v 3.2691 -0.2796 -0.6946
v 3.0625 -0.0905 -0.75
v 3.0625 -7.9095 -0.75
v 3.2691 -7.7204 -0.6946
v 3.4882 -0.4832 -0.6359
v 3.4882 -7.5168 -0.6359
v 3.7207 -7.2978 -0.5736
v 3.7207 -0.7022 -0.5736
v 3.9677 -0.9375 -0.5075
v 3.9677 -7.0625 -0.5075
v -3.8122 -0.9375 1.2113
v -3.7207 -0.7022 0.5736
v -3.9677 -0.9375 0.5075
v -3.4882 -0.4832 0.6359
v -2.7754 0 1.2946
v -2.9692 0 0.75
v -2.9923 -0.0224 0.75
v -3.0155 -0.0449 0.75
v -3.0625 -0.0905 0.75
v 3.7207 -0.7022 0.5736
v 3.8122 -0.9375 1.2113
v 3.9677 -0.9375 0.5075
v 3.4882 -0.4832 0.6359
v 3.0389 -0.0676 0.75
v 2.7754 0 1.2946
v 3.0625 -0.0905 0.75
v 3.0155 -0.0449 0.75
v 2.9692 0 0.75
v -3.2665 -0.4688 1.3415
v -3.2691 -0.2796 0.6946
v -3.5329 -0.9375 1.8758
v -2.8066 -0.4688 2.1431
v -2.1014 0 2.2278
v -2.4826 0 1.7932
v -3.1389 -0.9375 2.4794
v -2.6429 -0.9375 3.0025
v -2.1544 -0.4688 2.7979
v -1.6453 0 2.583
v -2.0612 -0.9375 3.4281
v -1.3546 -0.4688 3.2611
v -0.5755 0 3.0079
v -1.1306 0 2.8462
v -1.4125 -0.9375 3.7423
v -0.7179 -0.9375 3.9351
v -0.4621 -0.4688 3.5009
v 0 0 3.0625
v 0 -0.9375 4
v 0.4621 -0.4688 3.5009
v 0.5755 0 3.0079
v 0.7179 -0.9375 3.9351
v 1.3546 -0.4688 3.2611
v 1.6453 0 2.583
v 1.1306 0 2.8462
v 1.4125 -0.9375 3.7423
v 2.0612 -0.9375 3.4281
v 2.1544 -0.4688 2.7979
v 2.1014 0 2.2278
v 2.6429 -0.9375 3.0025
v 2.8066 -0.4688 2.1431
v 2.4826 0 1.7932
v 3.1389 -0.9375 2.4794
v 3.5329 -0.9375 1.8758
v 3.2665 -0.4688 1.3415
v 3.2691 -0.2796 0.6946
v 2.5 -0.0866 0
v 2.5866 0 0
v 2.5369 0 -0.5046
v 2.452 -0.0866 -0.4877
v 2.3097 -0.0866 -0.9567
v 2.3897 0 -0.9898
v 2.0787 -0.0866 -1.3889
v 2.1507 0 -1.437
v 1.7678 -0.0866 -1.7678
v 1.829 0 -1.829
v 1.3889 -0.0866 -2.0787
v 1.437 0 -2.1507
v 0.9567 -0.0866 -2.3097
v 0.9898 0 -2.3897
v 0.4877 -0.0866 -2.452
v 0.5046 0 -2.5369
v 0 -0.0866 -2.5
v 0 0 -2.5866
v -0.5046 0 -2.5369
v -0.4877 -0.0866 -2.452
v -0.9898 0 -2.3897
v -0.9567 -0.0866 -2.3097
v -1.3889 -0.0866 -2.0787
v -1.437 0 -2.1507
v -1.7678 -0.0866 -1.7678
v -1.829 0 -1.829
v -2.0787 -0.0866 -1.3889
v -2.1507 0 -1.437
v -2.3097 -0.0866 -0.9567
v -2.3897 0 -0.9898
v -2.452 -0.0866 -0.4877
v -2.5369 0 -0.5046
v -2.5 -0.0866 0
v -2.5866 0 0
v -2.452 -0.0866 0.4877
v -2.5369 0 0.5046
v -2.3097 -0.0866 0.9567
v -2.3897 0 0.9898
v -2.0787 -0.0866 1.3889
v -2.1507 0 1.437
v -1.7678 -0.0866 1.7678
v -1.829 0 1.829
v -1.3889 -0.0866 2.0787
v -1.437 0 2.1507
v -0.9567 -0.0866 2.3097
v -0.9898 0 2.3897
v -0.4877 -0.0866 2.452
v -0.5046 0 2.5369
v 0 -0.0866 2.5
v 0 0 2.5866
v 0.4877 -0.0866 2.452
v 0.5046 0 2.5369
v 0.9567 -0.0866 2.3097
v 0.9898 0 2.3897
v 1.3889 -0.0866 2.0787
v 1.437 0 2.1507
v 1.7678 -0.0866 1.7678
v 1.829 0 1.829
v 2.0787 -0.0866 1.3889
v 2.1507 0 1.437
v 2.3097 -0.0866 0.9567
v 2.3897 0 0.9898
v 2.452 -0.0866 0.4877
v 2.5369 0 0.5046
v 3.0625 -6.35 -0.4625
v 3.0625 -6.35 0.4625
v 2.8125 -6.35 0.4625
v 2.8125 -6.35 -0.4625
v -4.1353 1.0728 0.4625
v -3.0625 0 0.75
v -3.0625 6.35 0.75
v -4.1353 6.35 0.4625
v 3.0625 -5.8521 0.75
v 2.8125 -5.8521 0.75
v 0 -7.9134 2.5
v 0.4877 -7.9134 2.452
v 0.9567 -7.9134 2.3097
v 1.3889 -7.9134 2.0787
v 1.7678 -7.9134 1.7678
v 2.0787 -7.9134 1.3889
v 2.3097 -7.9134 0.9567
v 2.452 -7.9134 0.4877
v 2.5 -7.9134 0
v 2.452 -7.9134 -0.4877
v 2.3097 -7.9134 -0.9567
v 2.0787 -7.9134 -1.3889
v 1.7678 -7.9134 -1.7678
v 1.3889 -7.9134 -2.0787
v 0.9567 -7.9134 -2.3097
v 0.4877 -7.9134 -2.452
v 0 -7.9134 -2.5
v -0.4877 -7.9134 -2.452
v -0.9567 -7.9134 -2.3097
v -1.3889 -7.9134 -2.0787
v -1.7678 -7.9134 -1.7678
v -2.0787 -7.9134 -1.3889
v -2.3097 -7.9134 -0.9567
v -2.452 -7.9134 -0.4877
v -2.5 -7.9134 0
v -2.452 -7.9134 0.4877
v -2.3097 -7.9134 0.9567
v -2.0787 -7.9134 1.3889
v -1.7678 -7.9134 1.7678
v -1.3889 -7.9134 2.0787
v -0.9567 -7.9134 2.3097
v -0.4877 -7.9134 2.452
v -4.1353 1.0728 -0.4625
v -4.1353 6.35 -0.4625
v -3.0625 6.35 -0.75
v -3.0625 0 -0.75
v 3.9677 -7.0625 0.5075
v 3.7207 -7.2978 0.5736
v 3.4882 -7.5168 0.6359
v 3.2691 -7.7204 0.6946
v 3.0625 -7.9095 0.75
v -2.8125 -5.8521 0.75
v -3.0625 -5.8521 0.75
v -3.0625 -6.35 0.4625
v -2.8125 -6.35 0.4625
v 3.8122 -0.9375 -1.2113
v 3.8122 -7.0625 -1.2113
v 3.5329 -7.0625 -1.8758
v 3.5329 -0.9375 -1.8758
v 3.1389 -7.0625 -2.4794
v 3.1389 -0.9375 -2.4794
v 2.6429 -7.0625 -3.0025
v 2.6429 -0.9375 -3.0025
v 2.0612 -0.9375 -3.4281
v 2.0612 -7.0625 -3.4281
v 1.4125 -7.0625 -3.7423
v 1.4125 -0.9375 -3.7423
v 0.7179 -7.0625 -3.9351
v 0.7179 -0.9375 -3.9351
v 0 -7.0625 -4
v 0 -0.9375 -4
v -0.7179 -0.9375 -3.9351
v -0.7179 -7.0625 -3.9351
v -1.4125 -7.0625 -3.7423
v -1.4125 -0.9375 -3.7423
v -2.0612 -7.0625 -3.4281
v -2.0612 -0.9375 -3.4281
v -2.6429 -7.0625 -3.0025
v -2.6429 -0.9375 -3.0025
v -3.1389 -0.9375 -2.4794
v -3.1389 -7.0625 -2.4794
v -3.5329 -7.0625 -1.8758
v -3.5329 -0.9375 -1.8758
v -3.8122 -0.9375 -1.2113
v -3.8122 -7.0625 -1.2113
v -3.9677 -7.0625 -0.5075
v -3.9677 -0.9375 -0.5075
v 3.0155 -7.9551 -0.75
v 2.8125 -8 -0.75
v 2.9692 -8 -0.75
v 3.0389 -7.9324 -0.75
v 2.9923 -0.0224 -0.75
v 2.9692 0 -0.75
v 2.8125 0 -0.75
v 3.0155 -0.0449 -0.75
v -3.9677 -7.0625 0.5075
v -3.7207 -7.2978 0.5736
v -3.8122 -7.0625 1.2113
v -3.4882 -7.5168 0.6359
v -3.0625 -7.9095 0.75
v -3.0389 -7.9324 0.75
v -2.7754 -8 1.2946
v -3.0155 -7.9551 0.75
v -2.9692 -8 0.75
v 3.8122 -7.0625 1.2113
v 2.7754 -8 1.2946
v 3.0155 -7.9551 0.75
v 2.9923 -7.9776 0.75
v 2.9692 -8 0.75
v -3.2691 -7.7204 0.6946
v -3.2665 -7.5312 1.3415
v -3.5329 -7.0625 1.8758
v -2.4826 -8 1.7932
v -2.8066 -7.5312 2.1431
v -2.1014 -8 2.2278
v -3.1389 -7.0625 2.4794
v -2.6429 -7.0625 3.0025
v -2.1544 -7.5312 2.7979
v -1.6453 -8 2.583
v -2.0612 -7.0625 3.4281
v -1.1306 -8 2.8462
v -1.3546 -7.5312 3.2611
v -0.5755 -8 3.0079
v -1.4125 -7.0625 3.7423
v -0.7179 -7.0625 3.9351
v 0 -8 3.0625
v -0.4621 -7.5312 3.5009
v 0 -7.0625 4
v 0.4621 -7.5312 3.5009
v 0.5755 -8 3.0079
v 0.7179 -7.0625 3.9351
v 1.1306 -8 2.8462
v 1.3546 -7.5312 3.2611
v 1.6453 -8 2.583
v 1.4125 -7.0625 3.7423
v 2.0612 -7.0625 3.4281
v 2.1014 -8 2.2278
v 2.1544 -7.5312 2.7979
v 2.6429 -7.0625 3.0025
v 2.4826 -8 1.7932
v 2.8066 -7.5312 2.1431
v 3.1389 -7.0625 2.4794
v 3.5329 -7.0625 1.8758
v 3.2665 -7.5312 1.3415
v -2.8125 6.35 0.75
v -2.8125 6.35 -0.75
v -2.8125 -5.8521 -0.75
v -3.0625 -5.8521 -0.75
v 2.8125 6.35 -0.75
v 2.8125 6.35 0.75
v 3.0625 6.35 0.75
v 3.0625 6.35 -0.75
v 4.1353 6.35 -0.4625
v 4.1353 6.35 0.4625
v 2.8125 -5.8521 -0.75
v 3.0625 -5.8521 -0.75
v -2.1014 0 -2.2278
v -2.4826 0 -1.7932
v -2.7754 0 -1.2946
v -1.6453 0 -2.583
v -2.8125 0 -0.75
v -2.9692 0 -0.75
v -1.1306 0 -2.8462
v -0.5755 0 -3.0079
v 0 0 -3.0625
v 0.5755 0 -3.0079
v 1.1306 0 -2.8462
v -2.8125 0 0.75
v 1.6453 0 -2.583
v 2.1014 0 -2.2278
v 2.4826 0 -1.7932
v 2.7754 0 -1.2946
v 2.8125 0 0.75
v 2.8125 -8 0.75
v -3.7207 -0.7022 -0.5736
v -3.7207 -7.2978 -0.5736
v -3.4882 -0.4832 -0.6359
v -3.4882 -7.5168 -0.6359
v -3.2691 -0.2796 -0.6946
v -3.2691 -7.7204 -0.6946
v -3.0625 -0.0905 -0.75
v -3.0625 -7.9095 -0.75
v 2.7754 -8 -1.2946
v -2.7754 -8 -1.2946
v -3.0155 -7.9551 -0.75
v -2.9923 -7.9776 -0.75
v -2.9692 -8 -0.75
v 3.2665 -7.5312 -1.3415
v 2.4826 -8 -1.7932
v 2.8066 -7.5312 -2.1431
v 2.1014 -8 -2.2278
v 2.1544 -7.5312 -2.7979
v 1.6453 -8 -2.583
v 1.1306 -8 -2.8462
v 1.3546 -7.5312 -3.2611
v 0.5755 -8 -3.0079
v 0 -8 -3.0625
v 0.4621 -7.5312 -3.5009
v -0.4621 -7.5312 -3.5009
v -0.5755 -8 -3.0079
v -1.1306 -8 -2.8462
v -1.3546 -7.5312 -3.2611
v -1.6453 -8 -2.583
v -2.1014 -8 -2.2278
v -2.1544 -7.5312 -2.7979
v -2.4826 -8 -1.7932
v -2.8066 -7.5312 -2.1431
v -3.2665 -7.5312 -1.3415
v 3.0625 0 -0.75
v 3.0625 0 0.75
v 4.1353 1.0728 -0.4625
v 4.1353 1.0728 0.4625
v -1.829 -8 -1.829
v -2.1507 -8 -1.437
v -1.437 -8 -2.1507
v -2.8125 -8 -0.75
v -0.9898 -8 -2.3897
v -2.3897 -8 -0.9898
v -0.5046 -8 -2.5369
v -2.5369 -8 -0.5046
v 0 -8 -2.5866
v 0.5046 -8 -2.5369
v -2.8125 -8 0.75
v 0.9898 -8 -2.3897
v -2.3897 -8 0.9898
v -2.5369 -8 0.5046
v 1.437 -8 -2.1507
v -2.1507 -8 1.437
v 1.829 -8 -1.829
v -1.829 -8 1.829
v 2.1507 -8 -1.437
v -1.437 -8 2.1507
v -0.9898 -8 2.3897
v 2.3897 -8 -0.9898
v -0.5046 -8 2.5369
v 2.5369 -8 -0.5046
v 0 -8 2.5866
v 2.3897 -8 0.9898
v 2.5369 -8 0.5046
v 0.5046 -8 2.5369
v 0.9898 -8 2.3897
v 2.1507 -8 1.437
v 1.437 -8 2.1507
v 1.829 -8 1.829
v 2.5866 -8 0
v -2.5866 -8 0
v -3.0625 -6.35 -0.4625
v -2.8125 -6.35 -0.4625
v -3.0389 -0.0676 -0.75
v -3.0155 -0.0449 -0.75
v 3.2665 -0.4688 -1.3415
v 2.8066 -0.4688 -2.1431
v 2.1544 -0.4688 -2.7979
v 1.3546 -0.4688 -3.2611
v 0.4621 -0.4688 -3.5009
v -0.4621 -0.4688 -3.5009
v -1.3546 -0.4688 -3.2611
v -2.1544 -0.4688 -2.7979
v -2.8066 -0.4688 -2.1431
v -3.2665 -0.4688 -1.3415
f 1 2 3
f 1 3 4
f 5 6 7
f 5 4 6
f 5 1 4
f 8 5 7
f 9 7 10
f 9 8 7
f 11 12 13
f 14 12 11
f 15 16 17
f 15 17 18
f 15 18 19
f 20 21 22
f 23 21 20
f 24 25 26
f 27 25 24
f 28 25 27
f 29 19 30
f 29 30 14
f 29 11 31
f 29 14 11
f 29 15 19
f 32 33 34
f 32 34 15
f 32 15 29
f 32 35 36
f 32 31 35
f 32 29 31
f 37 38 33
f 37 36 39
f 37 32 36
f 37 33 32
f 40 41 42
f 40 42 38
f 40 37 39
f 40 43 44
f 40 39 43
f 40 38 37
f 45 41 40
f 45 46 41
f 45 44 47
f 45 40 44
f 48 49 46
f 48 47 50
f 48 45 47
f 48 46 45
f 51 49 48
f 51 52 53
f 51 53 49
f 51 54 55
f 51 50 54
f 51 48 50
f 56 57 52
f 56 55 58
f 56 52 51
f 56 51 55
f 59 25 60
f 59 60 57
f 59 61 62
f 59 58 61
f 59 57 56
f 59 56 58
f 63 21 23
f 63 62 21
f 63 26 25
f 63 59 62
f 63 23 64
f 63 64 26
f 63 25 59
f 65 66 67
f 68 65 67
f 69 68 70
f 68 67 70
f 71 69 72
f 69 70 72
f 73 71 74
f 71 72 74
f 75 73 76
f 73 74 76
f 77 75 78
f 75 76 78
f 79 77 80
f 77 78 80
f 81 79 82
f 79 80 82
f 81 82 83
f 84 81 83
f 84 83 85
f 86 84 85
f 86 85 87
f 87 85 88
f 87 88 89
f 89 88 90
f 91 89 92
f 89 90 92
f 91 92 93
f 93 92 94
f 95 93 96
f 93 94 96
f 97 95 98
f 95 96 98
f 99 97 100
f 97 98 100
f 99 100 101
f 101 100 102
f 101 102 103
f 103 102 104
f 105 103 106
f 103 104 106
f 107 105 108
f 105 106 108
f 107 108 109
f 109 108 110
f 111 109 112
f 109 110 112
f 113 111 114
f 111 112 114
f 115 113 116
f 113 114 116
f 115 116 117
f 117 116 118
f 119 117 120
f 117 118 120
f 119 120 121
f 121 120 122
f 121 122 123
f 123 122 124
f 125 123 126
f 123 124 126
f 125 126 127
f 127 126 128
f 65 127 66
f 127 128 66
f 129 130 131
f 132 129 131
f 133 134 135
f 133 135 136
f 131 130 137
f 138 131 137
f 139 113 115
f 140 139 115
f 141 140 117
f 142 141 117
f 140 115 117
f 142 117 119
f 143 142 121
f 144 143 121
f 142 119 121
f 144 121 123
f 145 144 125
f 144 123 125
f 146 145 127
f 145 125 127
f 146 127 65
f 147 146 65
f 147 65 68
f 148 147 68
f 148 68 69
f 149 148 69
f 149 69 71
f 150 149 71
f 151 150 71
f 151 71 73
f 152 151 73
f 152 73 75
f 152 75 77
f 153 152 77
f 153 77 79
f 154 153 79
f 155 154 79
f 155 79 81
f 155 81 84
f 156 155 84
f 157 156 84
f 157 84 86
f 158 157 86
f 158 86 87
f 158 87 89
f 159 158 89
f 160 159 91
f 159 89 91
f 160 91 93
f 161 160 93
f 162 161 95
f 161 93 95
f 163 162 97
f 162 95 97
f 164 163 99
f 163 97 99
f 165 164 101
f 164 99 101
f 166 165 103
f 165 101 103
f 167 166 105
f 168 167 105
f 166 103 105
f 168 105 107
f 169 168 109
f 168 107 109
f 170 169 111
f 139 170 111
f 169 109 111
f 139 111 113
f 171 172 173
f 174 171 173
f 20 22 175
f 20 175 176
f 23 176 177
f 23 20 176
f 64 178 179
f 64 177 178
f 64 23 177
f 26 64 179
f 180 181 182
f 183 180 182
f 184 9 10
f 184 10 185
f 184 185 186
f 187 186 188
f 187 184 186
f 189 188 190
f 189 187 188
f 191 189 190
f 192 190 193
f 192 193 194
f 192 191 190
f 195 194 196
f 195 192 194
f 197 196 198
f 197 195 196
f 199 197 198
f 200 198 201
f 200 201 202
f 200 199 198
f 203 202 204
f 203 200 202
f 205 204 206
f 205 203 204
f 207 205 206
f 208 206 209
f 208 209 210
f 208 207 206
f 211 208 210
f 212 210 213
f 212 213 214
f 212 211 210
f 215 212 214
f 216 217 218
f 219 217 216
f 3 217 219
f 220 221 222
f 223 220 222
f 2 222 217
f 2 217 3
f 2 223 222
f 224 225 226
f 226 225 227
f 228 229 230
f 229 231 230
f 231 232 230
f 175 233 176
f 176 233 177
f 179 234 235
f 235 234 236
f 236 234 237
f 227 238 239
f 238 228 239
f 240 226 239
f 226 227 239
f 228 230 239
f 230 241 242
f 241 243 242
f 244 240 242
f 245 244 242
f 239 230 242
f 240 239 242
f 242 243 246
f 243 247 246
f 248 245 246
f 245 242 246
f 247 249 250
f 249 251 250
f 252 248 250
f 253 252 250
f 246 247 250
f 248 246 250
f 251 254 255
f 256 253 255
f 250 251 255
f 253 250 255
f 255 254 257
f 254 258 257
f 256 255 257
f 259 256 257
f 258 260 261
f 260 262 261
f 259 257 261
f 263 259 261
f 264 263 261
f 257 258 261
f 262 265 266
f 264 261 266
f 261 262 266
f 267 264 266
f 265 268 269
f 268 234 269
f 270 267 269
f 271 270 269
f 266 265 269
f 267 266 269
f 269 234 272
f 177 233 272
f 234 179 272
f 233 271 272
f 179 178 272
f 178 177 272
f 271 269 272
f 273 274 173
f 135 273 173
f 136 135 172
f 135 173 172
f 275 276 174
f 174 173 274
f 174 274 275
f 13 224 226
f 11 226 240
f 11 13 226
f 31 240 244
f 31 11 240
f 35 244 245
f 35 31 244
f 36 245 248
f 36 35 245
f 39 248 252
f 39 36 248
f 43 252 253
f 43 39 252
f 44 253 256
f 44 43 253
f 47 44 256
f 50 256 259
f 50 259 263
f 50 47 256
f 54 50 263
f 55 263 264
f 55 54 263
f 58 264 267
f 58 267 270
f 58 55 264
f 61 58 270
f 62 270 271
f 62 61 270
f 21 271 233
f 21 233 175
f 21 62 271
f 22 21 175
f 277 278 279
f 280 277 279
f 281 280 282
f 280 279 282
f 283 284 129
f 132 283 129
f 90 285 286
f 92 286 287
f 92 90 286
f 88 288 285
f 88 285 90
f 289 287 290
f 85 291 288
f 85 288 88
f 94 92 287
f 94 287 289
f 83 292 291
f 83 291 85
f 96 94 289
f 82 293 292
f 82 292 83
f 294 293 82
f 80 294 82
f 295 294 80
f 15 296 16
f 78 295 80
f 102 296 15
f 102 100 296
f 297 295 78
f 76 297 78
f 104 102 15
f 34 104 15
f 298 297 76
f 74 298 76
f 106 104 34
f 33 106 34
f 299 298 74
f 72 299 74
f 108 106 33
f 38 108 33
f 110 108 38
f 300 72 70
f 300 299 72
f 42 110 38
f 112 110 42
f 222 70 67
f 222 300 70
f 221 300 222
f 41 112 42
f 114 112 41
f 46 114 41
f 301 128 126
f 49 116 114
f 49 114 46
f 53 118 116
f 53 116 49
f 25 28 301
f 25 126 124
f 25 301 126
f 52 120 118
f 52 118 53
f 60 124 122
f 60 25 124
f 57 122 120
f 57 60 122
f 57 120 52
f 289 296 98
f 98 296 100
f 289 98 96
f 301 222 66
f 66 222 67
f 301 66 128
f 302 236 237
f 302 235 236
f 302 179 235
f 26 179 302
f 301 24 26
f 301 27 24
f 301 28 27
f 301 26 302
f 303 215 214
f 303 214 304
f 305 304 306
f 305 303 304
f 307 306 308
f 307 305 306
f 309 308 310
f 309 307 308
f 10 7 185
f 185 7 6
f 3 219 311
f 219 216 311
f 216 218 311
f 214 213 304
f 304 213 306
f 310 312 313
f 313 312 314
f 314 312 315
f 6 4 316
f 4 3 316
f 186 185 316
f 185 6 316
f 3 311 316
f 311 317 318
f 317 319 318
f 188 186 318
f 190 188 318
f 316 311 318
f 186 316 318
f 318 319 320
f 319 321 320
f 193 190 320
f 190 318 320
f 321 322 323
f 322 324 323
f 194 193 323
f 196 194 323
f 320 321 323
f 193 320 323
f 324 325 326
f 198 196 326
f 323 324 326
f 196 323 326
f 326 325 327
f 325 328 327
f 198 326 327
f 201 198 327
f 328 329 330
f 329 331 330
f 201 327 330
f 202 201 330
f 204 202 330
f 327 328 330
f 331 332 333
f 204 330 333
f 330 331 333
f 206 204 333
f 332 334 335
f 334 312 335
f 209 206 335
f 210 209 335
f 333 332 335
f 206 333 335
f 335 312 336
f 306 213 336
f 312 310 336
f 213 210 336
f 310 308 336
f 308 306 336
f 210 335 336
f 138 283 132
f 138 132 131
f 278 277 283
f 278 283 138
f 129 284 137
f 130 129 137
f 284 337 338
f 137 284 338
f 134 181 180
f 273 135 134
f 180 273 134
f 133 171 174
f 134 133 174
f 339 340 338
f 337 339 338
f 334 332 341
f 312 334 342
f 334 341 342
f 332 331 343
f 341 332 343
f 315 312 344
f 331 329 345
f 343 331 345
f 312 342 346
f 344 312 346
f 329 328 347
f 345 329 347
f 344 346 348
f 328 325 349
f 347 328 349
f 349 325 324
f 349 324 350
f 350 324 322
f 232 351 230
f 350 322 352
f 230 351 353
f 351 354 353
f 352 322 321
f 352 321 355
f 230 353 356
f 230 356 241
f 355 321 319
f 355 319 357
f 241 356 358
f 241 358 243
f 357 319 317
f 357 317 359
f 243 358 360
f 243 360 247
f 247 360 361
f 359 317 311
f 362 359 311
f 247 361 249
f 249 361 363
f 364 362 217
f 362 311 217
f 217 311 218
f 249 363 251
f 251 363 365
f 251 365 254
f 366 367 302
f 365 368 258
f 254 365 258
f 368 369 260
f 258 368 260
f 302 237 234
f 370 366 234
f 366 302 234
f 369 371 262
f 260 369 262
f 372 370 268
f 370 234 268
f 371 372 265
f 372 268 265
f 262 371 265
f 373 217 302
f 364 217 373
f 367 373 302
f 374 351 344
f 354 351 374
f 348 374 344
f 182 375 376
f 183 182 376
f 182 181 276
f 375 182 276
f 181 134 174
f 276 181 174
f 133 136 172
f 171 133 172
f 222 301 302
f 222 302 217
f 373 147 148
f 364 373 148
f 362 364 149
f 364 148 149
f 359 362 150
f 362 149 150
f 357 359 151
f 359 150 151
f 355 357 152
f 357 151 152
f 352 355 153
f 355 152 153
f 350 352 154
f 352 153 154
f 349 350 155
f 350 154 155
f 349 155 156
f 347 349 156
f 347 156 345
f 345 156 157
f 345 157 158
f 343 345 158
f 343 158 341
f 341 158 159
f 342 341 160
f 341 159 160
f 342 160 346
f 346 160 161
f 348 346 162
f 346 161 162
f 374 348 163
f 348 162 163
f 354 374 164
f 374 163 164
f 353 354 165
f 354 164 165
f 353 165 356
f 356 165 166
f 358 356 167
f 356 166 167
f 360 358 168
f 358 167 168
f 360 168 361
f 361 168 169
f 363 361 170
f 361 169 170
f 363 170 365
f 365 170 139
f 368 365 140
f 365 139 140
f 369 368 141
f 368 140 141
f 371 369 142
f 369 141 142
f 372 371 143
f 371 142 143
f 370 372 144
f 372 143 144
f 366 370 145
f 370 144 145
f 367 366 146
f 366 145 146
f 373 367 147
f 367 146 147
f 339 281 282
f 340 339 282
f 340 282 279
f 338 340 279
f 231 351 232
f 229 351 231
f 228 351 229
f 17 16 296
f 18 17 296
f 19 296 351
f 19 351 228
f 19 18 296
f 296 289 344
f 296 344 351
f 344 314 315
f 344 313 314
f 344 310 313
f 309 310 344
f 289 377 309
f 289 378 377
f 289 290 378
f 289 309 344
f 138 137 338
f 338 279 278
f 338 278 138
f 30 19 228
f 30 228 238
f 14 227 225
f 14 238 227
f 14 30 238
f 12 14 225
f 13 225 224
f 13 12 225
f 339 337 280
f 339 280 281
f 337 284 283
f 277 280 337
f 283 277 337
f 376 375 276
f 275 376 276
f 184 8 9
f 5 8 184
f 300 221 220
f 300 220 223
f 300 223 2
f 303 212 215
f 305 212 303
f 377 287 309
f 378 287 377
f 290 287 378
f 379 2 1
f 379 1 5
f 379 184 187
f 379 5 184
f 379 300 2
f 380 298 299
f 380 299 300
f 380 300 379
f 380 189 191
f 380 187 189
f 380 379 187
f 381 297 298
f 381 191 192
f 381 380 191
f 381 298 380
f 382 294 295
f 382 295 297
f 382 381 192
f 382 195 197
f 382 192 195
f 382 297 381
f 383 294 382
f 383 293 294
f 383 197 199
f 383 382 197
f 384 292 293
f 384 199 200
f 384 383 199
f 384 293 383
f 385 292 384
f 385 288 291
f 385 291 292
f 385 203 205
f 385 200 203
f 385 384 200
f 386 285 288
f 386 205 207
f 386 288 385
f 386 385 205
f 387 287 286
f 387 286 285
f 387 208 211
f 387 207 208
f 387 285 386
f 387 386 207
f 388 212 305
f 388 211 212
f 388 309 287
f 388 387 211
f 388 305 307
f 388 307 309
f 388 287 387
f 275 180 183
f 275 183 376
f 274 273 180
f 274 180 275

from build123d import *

# Parameters (mm, degrees)
SKETCH3_R           = 4
EXTRUDE1_DEPTH      = 8
CHAMFER1_SIZE       = 0.9375
EXTRUDE2_DEPTH      = 10.797958971
CIRPATTERN1_COUNT   = 2
SKETCH6_R           = 2.5
EXTRUDE3_DEPTH      = 10.784808976
SKETCH12_W          = 0.25
SKETCH12_H          = 1.5
EXTRUDE6_DEPTH      = 6.35
EXTRUDE7_DEPTH      = 6.35
EXTRUDE8_DEPTH      = 10.853975964
EXTRUDE8_DEPTH_BACK = 10.853975964
EXTRUDE9_DEPTH      = 12.376442088
CIRPATTERN2_COUNT   = 2


# Read off the part's stored shape, not the designer's step: Extrude4, Extrude5
with BuildPart() as part:
    # Sketch3 → Extrude1 (new body)
    with BuildSketch(Plane(origin=(0, 0, 0), x_dir=(1, 0, 0), z_dir=(0, 1, 0))):
        with Locations(Location((0, 0, 0), (0, 0, 270))):
            Circle(SKETCH3_R)
    extrude(amount=-EXTRUDE1_DEPTH)

    # Chamfer1
    chamfer1_edges = [part.edges().sort_by_distance(p)[0] for p in [
        (0, 0, -4),
        (0, -8, -4),
    ]]
    chamfer(chamfer1_edges, length=CHAMFER1_SIZE)

    # Sketch11 → Extrude2 (cut, through all)
    with BuildSketch(Plane(origin=(0, 0, 0), x_dir=(1, 0, 0), z_dir=(0, 1, 0))):
        Polygon((-4, 0.498797632), (-3.0625, 0.75), (-2.8125, 0.75), (-2.8125, -0.75), (-3.0625, -0.75), (-4, -0.498797632), align=None)
    extrude2 = extrude(amount=-EXTRUDE2_DEPTH, mode=Mode.SUBTRACT)

    # CirPattern1: Extrude2 ×2 about axis
    cirpattern1_axis = Axis((0, 0, 0), (0, 1, 0))
    for i in range(1, CIRPATTERN1_COUNT):
        add(extrude2.rotate(cirpattern1_axis, i * 360 / CIRPATTERN1_COUNT), mode=Mode.SUBTRACT)

    # Sketch6 → Extrude3 (cut, through all)
    with BuildSketch(Plane(origin=(0, 0, 0), x_dir=(1, 0, 0), z_dir=(0, 1, 0))):
        with Locations(Location((0, 0, 0), (0, 0, 270))):
            Circle(SKETCH6_R)
    extrude(amount=-EXTRUDE3_DEPTH, mode=Mode.SUBTRACT)

    # Extrude4 outline → Extrude4 (revolve, cut)
    with BuildSketch(Plane.XY):
        Polygon((2.5, 0), (2.5, -0.08660254), (2.58660254, 0), align=None)
    revolve(axis=Axis((0, 0, 0), (0, 1, 0)), mode=Mode.SUBTRACT)

    # Extrude5 outline → Extrude5 (revolve, cut)
    with BuildSketch(Plane.XY):
        Polygon((2.58660254, -8), (2.5, -7.91339746), (2.5, -8), align=None)
    revolve(axis=Axis((0, 0, 0), (0, 1, 0)), mode=Mode.SUBTRACT)


with BuildPart() as body_2:
    # Sketch12 → Extrude6 (new, symmetric)
    with BuildSketch(Plane(origin=(0, 0, 0), x_dir=(1, 0, 0), z_dir=(0, 1, 0))):
        with Locations((-2.9375, 0)):
            Rectangle(SKETCH12_W, SKETCH12_H)
    extrude(amount=EXTRUDE6_DEPTH, both=True)

    # Sketch13 → Extrude7 (add)
    with BuildSketch(Plane(origin=(0, 6.35, 0), x_dir=(1, 0, 0), z_dir=(0, 1, 0))):
        Polygon((-4.135316469, 0.462539693), (-3.0625, 0.75), (-3.0625, -0.75), (-4.135316469, -0.462539693), align=None)
    extrude(amount=-EXTRUDE7_DEPTH)

    # Sketch14 → Extrude8 (cut, two sides: drawn at the far end of the back side and taken through both)
    with BuildSketch(Plane.XY.offset(-EXTRUDE8_DEPTH_BACK)):
        Polygon((-4.135316469, 0), (-4.135316469, 1.072816469), (-3.0625, 0), align=None)
    extrude(amount=EXTRUDE8_DEPTH + EXTRUDE8_DEPTH_BACK, mode=Mode.SUBTRACT)

    # Sketch15 → Extrude9 (cut, through all)
    with BuildSketch(Plane.ZY.offset(3.0625)):
        Polygon((-0.462539693, -6.35), (-0.75, -5.852104144), (-0.75, -6.35), align=None)
        Polygon((0.462539693, -6.35), (0.75, -6.35), (0.75, -5.852104144), align=None)
    extrude(amount=-EXTRUDE9_DEPTH, mode=Mode.SUBTRACT)


with BuildPart() as cirpattern2_1:
    # CirPattern2: pattern copy
    add(body_2.part.rotate(Axis((0, 0, 0), (0, 1, 0)), 1 * 360 / CIRPATTERN2_COUNT))


solid = Compound([part.part, body_2.part, cirpattern2_1.part])
